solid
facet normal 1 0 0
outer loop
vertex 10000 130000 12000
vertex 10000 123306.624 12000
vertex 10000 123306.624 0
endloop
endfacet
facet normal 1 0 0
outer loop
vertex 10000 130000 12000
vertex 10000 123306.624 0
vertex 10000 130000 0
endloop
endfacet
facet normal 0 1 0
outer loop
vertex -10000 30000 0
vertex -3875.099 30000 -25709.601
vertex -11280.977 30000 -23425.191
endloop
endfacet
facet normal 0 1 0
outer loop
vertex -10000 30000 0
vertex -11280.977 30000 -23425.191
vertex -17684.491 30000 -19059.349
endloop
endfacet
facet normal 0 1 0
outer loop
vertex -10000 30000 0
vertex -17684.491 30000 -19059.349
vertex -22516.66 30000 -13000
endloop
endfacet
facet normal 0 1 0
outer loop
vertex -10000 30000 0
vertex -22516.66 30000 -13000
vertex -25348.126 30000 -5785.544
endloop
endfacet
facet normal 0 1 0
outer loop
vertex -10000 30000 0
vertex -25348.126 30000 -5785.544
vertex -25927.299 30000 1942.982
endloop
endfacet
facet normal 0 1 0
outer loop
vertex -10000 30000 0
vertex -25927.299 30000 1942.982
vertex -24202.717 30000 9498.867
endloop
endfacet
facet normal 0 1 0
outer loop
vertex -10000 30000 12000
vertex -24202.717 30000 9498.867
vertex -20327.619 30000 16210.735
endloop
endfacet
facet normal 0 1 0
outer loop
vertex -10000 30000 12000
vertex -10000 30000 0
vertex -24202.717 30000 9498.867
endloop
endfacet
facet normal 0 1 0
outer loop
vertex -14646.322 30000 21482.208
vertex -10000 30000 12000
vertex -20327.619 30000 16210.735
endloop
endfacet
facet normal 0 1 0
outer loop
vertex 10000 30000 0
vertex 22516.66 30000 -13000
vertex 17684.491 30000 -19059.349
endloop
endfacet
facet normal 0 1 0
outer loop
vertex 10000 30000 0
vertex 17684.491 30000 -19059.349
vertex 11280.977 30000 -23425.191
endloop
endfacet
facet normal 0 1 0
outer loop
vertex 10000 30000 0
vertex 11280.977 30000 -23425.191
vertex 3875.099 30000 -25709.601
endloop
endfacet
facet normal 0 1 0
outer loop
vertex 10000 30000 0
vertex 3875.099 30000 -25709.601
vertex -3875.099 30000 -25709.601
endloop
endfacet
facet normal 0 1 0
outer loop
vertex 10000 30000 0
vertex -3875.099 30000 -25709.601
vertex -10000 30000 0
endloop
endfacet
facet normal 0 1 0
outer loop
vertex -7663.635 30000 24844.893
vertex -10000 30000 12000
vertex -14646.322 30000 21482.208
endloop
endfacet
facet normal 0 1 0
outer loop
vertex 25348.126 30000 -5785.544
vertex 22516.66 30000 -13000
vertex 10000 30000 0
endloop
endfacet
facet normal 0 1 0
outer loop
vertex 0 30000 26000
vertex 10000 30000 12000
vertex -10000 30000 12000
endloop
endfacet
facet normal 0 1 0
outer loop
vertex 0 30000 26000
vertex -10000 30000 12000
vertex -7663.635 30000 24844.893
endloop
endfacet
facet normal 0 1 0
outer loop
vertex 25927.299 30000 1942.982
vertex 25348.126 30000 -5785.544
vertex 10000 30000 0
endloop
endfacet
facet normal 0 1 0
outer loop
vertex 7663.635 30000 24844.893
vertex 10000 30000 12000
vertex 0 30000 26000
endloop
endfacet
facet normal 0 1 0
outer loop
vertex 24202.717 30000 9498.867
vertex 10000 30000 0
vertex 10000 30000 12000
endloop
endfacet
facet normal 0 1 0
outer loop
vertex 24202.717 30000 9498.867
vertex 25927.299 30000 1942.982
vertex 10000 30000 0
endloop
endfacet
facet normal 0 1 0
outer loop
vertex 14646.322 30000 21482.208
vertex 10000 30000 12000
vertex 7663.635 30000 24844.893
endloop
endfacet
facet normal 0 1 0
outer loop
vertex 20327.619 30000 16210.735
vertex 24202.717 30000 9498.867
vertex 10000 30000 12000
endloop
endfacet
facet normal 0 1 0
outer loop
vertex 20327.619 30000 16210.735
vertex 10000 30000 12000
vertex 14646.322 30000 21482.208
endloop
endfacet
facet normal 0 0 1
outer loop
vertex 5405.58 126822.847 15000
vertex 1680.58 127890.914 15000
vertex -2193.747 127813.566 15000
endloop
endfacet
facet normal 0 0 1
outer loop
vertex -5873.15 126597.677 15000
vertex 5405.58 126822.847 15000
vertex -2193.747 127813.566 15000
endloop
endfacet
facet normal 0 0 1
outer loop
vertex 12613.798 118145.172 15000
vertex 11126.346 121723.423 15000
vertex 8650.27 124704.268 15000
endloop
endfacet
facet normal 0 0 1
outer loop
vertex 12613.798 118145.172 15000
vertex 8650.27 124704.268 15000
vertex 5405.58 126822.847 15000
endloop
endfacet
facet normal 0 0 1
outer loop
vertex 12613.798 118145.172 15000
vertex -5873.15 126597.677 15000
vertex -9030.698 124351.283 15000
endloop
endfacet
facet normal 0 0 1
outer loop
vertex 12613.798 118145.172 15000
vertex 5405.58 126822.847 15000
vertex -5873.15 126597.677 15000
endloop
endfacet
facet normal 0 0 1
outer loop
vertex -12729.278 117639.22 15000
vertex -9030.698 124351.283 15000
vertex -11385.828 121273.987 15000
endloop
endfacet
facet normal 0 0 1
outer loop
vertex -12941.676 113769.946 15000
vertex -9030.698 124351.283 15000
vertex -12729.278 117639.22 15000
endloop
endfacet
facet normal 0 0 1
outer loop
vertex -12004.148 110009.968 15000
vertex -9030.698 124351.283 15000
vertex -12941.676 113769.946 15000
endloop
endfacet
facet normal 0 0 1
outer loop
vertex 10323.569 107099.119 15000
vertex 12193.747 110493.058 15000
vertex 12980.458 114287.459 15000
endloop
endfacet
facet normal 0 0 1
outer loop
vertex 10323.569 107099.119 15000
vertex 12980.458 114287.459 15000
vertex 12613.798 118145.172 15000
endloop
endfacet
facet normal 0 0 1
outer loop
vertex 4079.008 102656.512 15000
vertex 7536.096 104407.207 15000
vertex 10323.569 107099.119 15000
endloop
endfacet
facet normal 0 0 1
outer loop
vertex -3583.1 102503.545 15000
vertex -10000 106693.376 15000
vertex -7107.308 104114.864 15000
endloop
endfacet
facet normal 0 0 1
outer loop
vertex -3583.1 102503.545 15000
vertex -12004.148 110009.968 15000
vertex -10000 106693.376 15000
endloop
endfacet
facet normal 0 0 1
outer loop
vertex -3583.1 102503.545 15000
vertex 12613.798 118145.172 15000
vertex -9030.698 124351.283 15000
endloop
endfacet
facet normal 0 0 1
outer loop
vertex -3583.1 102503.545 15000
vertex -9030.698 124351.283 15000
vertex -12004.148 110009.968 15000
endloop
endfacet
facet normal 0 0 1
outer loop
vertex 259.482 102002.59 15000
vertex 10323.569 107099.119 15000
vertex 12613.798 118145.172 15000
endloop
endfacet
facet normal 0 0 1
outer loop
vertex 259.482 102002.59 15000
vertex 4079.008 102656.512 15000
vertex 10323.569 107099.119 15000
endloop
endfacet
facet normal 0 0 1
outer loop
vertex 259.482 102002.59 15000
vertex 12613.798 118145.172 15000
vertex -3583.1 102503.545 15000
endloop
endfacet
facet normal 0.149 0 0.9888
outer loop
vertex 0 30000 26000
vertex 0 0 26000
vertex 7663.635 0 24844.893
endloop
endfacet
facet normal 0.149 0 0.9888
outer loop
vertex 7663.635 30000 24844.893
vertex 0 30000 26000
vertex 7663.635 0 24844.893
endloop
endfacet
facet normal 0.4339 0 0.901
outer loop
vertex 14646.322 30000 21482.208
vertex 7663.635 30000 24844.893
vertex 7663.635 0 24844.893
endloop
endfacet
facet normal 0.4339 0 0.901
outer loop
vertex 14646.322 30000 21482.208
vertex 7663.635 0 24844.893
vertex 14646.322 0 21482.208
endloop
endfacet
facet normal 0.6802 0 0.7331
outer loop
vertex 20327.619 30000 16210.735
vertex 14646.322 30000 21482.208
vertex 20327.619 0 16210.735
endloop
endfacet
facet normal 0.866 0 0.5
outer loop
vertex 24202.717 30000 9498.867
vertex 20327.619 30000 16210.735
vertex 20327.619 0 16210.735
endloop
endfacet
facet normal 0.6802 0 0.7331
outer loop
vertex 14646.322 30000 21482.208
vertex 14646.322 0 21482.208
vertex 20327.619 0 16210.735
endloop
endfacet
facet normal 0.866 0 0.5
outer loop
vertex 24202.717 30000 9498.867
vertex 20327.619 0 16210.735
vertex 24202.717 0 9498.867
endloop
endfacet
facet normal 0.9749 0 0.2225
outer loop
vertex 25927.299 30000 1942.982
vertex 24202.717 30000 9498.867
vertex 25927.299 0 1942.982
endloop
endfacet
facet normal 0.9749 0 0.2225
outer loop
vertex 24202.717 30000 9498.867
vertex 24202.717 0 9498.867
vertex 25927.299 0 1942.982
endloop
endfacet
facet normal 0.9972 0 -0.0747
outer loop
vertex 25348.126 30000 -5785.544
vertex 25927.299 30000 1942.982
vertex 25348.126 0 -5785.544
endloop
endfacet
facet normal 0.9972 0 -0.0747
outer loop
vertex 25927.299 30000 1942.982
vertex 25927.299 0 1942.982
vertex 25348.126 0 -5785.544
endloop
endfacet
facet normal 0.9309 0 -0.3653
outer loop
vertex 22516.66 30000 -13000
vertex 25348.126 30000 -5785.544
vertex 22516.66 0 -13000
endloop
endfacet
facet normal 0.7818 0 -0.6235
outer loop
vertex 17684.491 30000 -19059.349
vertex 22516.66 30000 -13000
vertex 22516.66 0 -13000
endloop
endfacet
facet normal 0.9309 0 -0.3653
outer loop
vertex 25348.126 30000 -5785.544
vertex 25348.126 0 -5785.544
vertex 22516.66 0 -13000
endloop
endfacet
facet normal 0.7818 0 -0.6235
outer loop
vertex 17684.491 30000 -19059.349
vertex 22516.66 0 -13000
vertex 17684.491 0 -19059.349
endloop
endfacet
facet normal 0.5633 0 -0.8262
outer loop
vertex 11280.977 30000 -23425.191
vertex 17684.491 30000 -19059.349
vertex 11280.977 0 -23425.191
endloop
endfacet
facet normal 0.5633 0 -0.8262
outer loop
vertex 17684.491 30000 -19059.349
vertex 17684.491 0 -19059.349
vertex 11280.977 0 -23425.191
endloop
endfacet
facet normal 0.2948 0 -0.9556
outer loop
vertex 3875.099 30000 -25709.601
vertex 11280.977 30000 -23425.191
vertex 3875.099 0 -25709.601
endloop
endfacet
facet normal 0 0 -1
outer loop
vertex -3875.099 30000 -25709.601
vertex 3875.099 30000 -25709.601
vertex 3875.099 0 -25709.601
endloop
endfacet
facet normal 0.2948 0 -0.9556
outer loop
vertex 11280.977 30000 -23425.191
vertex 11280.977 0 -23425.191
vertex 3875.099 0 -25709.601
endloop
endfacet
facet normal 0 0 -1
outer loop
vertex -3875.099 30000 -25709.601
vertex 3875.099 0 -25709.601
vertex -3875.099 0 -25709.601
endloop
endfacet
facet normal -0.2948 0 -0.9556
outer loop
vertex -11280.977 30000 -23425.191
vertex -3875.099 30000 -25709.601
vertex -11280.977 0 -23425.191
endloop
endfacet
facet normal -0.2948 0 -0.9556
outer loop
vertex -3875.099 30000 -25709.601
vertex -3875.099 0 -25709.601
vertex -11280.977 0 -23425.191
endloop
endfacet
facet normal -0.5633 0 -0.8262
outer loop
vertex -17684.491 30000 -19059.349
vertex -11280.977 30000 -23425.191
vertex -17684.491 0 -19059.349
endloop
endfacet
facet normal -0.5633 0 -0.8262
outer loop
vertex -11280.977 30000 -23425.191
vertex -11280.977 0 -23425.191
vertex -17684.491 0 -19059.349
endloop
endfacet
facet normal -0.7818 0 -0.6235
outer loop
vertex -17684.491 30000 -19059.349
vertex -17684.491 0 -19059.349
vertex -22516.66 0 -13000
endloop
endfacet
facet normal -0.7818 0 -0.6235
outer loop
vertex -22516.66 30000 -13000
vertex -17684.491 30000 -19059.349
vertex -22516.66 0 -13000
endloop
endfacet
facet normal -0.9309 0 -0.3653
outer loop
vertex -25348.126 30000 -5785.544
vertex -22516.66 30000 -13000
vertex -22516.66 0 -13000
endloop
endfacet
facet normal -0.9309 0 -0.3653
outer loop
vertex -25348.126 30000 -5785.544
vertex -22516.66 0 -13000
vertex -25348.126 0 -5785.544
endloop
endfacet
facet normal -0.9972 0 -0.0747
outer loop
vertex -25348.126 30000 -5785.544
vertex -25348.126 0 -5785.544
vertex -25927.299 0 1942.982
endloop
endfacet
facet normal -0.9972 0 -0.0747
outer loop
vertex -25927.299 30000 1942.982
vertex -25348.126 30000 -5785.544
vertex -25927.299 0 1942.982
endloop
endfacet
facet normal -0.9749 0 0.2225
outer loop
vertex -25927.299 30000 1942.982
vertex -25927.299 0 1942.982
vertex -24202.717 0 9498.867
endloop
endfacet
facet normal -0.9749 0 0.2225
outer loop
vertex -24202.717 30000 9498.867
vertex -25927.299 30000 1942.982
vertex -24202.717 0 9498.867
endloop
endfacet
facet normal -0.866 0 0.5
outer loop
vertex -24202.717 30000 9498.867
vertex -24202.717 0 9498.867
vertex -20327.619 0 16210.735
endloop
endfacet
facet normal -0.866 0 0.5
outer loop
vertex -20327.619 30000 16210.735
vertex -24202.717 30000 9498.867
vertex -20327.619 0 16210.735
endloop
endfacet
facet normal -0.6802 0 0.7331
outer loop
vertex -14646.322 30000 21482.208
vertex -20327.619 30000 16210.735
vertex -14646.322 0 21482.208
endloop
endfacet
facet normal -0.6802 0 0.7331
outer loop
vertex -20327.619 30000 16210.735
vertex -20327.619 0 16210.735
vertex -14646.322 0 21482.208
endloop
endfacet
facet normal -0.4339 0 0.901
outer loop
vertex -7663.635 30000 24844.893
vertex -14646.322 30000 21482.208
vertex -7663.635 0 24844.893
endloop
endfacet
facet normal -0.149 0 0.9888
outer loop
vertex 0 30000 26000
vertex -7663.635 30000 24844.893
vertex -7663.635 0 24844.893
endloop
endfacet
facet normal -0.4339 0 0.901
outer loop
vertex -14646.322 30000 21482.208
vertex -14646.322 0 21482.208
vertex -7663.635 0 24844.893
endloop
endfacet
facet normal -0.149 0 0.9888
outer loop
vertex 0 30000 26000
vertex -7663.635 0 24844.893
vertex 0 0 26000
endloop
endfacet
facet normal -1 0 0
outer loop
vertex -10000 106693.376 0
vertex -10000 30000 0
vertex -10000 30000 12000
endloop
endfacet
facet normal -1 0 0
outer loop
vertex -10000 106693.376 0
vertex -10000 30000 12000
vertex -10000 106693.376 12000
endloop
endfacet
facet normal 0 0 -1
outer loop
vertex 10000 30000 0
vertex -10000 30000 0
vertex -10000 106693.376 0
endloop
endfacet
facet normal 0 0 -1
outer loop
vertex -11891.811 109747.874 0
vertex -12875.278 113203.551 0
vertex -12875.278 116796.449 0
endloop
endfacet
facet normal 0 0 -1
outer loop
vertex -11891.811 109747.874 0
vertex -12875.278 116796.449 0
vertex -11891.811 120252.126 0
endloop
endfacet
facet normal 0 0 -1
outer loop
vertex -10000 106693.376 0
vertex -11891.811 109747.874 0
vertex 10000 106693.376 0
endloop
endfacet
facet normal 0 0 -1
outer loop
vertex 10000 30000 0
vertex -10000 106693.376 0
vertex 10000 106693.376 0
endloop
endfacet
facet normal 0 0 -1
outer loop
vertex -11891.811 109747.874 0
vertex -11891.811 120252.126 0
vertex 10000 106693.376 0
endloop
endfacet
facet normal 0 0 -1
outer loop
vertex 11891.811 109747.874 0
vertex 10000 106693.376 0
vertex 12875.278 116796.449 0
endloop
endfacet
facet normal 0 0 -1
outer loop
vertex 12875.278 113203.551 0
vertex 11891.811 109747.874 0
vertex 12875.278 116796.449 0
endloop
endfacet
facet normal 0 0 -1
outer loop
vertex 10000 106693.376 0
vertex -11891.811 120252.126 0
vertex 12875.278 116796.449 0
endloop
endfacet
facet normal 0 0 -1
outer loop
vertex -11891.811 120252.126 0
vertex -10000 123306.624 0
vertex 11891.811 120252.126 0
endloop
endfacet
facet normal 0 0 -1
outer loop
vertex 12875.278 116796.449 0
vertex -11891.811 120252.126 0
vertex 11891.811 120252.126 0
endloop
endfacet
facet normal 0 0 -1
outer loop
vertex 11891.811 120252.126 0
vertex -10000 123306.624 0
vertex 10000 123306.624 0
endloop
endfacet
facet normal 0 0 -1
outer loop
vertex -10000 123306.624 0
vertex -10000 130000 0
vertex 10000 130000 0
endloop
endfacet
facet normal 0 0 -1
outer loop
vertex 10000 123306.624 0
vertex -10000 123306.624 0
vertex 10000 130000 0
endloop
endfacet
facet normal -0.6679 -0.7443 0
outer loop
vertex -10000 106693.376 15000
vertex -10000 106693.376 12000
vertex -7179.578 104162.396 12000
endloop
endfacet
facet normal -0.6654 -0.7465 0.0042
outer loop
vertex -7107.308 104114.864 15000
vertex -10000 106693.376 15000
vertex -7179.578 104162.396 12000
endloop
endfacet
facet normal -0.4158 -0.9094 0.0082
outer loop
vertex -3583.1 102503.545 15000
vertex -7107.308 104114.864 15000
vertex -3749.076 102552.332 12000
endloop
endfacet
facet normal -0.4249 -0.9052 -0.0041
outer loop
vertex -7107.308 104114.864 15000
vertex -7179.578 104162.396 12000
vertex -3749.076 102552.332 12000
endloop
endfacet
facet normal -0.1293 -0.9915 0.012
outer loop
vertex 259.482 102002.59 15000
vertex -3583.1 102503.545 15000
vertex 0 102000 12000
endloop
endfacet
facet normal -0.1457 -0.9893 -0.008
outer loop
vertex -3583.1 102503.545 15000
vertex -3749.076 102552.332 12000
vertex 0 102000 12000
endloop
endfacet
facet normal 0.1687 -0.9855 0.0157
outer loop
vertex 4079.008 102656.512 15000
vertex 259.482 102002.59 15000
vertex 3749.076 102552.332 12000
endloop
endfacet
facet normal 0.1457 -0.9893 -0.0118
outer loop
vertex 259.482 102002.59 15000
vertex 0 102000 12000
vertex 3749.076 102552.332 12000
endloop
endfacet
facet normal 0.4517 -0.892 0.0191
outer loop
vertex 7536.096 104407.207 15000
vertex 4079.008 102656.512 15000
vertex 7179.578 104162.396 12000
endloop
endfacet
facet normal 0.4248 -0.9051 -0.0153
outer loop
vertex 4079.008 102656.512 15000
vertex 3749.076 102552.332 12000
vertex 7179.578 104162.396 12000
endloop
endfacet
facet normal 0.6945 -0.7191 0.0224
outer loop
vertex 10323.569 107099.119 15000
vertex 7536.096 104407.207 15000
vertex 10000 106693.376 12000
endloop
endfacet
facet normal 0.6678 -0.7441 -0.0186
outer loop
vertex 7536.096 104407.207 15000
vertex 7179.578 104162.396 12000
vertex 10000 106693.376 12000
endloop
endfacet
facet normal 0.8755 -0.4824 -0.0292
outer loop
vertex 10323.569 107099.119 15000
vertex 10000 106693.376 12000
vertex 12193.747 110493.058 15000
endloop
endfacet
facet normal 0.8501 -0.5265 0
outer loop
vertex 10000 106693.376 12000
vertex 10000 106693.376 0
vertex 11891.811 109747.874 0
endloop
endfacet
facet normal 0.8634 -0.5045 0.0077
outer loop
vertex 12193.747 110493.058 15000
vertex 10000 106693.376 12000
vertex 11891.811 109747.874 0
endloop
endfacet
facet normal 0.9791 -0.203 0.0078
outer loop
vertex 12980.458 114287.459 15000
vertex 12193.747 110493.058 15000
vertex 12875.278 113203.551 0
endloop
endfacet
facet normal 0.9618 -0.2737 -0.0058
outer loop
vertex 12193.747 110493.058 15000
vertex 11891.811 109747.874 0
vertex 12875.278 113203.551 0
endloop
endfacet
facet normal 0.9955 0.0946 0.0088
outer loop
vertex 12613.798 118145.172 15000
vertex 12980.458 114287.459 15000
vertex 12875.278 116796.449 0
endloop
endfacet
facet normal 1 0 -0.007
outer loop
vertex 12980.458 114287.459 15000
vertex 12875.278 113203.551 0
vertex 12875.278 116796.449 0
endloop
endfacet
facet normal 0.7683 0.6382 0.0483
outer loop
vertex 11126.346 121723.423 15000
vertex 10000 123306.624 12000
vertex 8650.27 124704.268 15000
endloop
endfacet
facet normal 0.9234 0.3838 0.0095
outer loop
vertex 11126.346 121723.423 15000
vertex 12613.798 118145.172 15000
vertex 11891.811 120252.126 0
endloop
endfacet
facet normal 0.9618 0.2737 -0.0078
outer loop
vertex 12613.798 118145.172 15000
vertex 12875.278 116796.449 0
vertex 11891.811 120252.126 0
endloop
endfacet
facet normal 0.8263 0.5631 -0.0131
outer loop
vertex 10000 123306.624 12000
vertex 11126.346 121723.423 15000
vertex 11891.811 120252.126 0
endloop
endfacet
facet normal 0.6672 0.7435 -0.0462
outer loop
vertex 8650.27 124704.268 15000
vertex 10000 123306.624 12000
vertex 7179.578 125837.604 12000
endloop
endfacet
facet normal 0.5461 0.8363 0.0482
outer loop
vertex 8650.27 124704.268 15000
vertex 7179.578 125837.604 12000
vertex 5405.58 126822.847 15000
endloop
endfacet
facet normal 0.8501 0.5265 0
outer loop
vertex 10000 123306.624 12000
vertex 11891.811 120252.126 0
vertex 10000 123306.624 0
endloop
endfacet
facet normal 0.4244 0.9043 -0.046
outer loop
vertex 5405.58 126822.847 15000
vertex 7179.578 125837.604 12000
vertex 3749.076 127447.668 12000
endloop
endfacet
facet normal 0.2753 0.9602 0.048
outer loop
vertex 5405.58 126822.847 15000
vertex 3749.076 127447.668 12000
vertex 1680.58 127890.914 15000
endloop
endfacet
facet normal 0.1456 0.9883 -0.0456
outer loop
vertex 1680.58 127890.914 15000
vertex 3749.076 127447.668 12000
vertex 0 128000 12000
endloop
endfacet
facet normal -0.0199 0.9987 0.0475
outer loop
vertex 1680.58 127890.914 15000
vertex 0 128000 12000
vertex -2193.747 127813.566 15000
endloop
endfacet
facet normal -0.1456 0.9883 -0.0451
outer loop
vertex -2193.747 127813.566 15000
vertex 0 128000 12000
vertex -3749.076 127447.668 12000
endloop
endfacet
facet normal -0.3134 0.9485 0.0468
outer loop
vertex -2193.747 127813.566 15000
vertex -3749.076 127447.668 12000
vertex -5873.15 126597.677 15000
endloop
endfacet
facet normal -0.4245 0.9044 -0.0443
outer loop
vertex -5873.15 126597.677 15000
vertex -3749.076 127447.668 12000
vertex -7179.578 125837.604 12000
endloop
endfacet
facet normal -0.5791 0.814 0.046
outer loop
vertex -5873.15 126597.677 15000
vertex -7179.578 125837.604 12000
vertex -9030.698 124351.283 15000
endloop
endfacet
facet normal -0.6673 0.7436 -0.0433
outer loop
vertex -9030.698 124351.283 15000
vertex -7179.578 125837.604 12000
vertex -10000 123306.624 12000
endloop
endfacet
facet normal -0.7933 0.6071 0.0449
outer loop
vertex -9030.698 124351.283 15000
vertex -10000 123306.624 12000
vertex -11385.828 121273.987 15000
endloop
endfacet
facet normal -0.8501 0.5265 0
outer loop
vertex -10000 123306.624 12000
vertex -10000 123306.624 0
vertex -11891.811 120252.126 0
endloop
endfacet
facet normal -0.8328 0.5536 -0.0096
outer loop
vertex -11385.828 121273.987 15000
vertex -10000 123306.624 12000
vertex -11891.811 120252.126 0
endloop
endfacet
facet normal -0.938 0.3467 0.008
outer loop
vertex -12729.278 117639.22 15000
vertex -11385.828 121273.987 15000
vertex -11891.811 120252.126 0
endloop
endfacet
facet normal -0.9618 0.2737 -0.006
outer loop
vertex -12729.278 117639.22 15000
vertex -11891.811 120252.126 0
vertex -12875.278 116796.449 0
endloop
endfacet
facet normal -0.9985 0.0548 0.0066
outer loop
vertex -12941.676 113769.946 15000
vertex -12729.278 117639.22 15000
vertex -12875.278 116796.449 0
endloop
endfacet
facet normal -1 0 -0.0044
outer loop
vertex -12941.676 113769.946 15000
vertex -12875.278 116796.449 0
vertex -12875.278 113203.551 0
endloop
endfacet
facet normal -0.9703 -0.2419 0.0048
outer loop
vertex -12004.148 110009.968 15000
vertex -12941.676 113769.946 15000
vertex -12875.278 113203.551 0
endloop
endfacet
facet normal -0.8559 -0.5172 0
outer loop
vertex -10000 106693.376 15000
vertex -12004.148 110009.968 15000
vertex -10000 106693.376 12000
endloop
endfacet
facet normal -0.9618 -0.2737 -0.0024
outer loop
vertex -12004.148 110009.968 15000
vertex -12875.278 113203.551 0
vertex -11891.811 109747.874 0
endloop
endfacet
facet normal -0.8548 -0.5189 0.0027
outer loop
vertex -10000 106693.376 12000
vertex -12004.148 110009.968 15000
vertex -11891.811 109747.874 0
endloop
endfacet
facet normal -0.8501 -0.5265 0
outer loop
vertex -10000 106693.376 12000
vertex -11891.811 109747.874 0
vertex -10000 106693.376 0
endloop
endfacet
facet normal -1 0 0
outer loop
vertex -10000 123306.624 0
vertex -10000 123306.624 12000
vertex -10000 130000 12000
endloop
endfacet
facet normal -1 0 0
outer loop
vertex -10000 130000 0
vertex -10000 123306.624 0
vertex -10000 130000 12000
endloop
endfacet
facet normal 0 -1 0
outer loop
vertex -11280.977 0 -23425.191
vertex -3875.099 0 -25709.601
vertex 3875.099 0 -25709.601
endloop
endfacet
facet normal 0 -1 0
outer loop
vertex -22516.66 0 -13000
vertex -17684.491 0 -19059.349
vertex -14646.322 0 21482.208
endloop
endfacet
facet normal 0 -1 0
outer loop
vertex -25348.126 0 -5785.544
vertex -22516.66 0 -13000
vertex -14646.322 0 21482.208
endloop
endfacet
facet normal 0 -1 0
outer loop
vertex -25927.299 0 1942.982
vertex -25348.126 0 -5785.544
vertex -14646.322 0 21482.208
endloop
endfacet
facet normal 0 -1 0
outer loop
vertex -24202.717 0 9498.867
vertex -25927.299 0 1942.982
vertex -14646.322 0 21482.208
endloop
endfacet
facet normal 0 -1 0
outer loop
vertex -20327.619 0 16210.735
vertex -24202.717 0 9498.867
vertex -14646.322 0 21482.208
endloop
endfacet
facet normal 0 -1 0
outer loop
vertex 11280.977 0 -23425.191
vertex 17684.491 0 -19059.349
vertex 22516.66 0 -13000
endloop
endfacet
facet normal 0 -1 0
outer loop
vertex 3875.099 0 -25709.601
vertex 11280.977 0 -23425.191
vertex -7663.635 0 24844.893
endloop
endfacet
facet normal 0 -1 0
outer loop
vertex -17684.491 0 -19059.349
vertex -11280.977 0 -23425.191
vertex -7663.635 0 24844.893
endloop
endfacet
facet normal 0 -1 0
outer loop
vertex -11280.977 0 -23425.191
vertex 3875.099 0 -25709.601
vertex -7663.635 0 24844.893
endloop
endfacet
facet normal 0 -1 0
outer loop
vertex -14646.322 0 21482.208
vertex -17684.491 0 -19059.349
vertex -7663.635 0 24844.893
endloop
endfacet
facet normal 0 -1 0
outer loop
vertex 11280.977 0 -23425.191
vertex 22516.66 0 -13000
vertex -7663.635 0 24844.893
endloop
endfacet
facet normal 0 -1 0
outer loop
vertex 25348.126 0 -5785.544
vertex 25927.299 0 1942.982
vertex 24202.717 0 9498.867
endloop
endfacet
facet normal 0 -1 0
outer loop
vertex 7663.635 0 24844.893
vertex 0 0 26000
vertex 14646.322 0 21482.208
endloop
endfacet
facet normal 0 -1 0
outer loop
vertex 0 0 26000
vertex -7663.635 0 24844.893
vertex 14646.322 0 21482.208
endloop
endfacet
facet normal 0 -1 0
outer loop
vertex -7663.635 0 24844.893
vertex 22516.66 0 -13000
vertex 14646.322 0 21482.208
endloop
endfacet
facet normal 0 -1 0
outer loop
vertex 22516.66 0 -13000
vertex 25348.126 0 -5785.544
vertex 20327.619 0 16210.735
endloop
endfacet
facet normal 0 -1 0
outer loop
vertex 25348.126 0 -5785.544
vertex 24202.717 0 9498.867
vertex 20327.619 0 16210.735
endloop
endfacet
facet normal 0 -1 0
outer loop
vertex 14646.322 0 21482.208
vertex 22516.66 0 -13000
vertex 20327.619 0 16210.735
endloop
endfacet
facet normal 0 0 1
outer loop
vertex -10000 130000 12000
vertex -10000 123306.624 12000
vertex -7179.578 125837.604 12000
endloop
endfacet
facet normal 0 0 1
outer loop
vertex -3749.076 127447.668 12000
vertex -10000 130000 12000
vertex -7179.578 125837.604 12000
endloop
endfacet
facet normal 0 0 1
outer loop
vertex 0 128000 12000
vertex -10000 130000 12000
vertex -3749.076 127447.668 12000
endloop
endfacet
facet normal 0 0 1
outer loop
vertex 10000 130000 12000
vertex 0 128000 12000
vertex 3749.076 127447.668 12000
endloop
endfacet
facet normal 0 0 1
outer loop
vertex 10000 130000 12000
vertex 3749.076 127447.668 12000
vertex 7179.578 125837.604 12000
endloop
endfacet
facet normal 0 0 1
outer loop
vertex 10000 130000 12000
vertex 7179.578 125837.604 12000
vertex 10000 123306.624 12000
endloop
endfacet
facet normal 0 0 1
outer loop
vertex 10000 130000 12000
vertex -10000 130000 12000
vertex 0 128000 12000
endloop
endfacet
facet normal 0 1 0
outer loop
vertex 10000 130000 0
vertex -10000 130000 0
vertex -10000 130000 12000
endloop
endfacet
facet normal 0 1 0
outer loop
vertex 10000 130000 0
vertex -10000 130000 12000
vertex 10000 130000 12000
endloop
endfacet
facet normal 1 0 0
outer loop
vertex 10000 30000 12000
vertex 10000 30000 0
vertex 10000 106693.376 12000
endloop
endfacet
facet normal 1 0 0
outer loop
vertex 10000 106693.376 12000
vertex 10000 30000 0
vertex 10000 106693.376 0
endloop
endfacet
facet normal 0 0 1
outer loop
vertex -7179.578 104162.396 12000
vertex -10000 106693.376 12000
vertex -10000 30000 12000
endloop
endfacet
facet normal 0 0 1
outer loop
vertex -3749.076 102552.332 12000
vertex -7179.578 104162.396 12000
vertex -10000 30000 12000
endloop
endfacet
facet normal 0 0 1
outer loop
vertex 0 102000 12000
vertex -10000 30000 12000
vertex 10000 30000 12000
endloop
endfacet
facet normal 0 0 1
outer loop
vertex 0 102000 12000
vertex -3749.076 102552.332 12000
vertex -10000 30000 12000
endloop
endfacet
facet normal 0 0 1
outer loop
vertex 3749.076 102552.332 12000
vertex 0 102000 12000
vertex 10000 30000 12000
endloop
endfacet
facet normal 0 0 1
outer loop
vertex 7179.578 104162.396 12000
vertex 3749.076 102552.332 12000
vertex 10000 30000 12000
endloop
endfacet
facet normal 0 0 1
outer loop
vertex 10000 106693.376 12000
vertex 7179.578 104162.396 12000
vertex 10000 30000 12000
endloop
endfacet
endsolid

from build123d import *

# Parameters (mm, degrees)
SKETCH_1_R      = 26000
EXTRUDE_1_DEPTH = 30000
SKETCH_2_W      = 20000
SKETCH_2_H      = 104000
EXTRUDE_2_DEPTH = 12000
SKETCH_3_R      = 13000
EXTRUDE_3_DEPTH = 15000


with BuildPart() as part:
    # 草图1 → 凸台-拉伸1 (new body)
    with BuildSketch(Plane(origin=(0, 0, 0), x_dir=(1, 0, 0), z_dir=(0, 1, 0))):
        with Locations(Location((0, 0, 0), (0, 0, 270))):
            Circle(SKETCH_1_R)
    extrude(amount=EXTRUDE_1_DEPTH)

    # 草图2 → 凸台-拉伸2 (add)
    with BuildSketch(Plane.XY):
        with Locations((0, 78000)):
            Rectangle(SKETCH_2_W, SKETCH_2_H)
    extrude(amount=EXTRUDE_2_DEPTH)

    # 草图3 → 凸台-拉伸3 (add)
    with BuildSketch(Plane.XY):
        with Locations(Location((0, 115000, 0), (0, 0, 219.715137232))):
            Circle(SKETCH_3_R)
    extrude(amount=EXTRUDE_3_DEPTH)


solid = part.part
